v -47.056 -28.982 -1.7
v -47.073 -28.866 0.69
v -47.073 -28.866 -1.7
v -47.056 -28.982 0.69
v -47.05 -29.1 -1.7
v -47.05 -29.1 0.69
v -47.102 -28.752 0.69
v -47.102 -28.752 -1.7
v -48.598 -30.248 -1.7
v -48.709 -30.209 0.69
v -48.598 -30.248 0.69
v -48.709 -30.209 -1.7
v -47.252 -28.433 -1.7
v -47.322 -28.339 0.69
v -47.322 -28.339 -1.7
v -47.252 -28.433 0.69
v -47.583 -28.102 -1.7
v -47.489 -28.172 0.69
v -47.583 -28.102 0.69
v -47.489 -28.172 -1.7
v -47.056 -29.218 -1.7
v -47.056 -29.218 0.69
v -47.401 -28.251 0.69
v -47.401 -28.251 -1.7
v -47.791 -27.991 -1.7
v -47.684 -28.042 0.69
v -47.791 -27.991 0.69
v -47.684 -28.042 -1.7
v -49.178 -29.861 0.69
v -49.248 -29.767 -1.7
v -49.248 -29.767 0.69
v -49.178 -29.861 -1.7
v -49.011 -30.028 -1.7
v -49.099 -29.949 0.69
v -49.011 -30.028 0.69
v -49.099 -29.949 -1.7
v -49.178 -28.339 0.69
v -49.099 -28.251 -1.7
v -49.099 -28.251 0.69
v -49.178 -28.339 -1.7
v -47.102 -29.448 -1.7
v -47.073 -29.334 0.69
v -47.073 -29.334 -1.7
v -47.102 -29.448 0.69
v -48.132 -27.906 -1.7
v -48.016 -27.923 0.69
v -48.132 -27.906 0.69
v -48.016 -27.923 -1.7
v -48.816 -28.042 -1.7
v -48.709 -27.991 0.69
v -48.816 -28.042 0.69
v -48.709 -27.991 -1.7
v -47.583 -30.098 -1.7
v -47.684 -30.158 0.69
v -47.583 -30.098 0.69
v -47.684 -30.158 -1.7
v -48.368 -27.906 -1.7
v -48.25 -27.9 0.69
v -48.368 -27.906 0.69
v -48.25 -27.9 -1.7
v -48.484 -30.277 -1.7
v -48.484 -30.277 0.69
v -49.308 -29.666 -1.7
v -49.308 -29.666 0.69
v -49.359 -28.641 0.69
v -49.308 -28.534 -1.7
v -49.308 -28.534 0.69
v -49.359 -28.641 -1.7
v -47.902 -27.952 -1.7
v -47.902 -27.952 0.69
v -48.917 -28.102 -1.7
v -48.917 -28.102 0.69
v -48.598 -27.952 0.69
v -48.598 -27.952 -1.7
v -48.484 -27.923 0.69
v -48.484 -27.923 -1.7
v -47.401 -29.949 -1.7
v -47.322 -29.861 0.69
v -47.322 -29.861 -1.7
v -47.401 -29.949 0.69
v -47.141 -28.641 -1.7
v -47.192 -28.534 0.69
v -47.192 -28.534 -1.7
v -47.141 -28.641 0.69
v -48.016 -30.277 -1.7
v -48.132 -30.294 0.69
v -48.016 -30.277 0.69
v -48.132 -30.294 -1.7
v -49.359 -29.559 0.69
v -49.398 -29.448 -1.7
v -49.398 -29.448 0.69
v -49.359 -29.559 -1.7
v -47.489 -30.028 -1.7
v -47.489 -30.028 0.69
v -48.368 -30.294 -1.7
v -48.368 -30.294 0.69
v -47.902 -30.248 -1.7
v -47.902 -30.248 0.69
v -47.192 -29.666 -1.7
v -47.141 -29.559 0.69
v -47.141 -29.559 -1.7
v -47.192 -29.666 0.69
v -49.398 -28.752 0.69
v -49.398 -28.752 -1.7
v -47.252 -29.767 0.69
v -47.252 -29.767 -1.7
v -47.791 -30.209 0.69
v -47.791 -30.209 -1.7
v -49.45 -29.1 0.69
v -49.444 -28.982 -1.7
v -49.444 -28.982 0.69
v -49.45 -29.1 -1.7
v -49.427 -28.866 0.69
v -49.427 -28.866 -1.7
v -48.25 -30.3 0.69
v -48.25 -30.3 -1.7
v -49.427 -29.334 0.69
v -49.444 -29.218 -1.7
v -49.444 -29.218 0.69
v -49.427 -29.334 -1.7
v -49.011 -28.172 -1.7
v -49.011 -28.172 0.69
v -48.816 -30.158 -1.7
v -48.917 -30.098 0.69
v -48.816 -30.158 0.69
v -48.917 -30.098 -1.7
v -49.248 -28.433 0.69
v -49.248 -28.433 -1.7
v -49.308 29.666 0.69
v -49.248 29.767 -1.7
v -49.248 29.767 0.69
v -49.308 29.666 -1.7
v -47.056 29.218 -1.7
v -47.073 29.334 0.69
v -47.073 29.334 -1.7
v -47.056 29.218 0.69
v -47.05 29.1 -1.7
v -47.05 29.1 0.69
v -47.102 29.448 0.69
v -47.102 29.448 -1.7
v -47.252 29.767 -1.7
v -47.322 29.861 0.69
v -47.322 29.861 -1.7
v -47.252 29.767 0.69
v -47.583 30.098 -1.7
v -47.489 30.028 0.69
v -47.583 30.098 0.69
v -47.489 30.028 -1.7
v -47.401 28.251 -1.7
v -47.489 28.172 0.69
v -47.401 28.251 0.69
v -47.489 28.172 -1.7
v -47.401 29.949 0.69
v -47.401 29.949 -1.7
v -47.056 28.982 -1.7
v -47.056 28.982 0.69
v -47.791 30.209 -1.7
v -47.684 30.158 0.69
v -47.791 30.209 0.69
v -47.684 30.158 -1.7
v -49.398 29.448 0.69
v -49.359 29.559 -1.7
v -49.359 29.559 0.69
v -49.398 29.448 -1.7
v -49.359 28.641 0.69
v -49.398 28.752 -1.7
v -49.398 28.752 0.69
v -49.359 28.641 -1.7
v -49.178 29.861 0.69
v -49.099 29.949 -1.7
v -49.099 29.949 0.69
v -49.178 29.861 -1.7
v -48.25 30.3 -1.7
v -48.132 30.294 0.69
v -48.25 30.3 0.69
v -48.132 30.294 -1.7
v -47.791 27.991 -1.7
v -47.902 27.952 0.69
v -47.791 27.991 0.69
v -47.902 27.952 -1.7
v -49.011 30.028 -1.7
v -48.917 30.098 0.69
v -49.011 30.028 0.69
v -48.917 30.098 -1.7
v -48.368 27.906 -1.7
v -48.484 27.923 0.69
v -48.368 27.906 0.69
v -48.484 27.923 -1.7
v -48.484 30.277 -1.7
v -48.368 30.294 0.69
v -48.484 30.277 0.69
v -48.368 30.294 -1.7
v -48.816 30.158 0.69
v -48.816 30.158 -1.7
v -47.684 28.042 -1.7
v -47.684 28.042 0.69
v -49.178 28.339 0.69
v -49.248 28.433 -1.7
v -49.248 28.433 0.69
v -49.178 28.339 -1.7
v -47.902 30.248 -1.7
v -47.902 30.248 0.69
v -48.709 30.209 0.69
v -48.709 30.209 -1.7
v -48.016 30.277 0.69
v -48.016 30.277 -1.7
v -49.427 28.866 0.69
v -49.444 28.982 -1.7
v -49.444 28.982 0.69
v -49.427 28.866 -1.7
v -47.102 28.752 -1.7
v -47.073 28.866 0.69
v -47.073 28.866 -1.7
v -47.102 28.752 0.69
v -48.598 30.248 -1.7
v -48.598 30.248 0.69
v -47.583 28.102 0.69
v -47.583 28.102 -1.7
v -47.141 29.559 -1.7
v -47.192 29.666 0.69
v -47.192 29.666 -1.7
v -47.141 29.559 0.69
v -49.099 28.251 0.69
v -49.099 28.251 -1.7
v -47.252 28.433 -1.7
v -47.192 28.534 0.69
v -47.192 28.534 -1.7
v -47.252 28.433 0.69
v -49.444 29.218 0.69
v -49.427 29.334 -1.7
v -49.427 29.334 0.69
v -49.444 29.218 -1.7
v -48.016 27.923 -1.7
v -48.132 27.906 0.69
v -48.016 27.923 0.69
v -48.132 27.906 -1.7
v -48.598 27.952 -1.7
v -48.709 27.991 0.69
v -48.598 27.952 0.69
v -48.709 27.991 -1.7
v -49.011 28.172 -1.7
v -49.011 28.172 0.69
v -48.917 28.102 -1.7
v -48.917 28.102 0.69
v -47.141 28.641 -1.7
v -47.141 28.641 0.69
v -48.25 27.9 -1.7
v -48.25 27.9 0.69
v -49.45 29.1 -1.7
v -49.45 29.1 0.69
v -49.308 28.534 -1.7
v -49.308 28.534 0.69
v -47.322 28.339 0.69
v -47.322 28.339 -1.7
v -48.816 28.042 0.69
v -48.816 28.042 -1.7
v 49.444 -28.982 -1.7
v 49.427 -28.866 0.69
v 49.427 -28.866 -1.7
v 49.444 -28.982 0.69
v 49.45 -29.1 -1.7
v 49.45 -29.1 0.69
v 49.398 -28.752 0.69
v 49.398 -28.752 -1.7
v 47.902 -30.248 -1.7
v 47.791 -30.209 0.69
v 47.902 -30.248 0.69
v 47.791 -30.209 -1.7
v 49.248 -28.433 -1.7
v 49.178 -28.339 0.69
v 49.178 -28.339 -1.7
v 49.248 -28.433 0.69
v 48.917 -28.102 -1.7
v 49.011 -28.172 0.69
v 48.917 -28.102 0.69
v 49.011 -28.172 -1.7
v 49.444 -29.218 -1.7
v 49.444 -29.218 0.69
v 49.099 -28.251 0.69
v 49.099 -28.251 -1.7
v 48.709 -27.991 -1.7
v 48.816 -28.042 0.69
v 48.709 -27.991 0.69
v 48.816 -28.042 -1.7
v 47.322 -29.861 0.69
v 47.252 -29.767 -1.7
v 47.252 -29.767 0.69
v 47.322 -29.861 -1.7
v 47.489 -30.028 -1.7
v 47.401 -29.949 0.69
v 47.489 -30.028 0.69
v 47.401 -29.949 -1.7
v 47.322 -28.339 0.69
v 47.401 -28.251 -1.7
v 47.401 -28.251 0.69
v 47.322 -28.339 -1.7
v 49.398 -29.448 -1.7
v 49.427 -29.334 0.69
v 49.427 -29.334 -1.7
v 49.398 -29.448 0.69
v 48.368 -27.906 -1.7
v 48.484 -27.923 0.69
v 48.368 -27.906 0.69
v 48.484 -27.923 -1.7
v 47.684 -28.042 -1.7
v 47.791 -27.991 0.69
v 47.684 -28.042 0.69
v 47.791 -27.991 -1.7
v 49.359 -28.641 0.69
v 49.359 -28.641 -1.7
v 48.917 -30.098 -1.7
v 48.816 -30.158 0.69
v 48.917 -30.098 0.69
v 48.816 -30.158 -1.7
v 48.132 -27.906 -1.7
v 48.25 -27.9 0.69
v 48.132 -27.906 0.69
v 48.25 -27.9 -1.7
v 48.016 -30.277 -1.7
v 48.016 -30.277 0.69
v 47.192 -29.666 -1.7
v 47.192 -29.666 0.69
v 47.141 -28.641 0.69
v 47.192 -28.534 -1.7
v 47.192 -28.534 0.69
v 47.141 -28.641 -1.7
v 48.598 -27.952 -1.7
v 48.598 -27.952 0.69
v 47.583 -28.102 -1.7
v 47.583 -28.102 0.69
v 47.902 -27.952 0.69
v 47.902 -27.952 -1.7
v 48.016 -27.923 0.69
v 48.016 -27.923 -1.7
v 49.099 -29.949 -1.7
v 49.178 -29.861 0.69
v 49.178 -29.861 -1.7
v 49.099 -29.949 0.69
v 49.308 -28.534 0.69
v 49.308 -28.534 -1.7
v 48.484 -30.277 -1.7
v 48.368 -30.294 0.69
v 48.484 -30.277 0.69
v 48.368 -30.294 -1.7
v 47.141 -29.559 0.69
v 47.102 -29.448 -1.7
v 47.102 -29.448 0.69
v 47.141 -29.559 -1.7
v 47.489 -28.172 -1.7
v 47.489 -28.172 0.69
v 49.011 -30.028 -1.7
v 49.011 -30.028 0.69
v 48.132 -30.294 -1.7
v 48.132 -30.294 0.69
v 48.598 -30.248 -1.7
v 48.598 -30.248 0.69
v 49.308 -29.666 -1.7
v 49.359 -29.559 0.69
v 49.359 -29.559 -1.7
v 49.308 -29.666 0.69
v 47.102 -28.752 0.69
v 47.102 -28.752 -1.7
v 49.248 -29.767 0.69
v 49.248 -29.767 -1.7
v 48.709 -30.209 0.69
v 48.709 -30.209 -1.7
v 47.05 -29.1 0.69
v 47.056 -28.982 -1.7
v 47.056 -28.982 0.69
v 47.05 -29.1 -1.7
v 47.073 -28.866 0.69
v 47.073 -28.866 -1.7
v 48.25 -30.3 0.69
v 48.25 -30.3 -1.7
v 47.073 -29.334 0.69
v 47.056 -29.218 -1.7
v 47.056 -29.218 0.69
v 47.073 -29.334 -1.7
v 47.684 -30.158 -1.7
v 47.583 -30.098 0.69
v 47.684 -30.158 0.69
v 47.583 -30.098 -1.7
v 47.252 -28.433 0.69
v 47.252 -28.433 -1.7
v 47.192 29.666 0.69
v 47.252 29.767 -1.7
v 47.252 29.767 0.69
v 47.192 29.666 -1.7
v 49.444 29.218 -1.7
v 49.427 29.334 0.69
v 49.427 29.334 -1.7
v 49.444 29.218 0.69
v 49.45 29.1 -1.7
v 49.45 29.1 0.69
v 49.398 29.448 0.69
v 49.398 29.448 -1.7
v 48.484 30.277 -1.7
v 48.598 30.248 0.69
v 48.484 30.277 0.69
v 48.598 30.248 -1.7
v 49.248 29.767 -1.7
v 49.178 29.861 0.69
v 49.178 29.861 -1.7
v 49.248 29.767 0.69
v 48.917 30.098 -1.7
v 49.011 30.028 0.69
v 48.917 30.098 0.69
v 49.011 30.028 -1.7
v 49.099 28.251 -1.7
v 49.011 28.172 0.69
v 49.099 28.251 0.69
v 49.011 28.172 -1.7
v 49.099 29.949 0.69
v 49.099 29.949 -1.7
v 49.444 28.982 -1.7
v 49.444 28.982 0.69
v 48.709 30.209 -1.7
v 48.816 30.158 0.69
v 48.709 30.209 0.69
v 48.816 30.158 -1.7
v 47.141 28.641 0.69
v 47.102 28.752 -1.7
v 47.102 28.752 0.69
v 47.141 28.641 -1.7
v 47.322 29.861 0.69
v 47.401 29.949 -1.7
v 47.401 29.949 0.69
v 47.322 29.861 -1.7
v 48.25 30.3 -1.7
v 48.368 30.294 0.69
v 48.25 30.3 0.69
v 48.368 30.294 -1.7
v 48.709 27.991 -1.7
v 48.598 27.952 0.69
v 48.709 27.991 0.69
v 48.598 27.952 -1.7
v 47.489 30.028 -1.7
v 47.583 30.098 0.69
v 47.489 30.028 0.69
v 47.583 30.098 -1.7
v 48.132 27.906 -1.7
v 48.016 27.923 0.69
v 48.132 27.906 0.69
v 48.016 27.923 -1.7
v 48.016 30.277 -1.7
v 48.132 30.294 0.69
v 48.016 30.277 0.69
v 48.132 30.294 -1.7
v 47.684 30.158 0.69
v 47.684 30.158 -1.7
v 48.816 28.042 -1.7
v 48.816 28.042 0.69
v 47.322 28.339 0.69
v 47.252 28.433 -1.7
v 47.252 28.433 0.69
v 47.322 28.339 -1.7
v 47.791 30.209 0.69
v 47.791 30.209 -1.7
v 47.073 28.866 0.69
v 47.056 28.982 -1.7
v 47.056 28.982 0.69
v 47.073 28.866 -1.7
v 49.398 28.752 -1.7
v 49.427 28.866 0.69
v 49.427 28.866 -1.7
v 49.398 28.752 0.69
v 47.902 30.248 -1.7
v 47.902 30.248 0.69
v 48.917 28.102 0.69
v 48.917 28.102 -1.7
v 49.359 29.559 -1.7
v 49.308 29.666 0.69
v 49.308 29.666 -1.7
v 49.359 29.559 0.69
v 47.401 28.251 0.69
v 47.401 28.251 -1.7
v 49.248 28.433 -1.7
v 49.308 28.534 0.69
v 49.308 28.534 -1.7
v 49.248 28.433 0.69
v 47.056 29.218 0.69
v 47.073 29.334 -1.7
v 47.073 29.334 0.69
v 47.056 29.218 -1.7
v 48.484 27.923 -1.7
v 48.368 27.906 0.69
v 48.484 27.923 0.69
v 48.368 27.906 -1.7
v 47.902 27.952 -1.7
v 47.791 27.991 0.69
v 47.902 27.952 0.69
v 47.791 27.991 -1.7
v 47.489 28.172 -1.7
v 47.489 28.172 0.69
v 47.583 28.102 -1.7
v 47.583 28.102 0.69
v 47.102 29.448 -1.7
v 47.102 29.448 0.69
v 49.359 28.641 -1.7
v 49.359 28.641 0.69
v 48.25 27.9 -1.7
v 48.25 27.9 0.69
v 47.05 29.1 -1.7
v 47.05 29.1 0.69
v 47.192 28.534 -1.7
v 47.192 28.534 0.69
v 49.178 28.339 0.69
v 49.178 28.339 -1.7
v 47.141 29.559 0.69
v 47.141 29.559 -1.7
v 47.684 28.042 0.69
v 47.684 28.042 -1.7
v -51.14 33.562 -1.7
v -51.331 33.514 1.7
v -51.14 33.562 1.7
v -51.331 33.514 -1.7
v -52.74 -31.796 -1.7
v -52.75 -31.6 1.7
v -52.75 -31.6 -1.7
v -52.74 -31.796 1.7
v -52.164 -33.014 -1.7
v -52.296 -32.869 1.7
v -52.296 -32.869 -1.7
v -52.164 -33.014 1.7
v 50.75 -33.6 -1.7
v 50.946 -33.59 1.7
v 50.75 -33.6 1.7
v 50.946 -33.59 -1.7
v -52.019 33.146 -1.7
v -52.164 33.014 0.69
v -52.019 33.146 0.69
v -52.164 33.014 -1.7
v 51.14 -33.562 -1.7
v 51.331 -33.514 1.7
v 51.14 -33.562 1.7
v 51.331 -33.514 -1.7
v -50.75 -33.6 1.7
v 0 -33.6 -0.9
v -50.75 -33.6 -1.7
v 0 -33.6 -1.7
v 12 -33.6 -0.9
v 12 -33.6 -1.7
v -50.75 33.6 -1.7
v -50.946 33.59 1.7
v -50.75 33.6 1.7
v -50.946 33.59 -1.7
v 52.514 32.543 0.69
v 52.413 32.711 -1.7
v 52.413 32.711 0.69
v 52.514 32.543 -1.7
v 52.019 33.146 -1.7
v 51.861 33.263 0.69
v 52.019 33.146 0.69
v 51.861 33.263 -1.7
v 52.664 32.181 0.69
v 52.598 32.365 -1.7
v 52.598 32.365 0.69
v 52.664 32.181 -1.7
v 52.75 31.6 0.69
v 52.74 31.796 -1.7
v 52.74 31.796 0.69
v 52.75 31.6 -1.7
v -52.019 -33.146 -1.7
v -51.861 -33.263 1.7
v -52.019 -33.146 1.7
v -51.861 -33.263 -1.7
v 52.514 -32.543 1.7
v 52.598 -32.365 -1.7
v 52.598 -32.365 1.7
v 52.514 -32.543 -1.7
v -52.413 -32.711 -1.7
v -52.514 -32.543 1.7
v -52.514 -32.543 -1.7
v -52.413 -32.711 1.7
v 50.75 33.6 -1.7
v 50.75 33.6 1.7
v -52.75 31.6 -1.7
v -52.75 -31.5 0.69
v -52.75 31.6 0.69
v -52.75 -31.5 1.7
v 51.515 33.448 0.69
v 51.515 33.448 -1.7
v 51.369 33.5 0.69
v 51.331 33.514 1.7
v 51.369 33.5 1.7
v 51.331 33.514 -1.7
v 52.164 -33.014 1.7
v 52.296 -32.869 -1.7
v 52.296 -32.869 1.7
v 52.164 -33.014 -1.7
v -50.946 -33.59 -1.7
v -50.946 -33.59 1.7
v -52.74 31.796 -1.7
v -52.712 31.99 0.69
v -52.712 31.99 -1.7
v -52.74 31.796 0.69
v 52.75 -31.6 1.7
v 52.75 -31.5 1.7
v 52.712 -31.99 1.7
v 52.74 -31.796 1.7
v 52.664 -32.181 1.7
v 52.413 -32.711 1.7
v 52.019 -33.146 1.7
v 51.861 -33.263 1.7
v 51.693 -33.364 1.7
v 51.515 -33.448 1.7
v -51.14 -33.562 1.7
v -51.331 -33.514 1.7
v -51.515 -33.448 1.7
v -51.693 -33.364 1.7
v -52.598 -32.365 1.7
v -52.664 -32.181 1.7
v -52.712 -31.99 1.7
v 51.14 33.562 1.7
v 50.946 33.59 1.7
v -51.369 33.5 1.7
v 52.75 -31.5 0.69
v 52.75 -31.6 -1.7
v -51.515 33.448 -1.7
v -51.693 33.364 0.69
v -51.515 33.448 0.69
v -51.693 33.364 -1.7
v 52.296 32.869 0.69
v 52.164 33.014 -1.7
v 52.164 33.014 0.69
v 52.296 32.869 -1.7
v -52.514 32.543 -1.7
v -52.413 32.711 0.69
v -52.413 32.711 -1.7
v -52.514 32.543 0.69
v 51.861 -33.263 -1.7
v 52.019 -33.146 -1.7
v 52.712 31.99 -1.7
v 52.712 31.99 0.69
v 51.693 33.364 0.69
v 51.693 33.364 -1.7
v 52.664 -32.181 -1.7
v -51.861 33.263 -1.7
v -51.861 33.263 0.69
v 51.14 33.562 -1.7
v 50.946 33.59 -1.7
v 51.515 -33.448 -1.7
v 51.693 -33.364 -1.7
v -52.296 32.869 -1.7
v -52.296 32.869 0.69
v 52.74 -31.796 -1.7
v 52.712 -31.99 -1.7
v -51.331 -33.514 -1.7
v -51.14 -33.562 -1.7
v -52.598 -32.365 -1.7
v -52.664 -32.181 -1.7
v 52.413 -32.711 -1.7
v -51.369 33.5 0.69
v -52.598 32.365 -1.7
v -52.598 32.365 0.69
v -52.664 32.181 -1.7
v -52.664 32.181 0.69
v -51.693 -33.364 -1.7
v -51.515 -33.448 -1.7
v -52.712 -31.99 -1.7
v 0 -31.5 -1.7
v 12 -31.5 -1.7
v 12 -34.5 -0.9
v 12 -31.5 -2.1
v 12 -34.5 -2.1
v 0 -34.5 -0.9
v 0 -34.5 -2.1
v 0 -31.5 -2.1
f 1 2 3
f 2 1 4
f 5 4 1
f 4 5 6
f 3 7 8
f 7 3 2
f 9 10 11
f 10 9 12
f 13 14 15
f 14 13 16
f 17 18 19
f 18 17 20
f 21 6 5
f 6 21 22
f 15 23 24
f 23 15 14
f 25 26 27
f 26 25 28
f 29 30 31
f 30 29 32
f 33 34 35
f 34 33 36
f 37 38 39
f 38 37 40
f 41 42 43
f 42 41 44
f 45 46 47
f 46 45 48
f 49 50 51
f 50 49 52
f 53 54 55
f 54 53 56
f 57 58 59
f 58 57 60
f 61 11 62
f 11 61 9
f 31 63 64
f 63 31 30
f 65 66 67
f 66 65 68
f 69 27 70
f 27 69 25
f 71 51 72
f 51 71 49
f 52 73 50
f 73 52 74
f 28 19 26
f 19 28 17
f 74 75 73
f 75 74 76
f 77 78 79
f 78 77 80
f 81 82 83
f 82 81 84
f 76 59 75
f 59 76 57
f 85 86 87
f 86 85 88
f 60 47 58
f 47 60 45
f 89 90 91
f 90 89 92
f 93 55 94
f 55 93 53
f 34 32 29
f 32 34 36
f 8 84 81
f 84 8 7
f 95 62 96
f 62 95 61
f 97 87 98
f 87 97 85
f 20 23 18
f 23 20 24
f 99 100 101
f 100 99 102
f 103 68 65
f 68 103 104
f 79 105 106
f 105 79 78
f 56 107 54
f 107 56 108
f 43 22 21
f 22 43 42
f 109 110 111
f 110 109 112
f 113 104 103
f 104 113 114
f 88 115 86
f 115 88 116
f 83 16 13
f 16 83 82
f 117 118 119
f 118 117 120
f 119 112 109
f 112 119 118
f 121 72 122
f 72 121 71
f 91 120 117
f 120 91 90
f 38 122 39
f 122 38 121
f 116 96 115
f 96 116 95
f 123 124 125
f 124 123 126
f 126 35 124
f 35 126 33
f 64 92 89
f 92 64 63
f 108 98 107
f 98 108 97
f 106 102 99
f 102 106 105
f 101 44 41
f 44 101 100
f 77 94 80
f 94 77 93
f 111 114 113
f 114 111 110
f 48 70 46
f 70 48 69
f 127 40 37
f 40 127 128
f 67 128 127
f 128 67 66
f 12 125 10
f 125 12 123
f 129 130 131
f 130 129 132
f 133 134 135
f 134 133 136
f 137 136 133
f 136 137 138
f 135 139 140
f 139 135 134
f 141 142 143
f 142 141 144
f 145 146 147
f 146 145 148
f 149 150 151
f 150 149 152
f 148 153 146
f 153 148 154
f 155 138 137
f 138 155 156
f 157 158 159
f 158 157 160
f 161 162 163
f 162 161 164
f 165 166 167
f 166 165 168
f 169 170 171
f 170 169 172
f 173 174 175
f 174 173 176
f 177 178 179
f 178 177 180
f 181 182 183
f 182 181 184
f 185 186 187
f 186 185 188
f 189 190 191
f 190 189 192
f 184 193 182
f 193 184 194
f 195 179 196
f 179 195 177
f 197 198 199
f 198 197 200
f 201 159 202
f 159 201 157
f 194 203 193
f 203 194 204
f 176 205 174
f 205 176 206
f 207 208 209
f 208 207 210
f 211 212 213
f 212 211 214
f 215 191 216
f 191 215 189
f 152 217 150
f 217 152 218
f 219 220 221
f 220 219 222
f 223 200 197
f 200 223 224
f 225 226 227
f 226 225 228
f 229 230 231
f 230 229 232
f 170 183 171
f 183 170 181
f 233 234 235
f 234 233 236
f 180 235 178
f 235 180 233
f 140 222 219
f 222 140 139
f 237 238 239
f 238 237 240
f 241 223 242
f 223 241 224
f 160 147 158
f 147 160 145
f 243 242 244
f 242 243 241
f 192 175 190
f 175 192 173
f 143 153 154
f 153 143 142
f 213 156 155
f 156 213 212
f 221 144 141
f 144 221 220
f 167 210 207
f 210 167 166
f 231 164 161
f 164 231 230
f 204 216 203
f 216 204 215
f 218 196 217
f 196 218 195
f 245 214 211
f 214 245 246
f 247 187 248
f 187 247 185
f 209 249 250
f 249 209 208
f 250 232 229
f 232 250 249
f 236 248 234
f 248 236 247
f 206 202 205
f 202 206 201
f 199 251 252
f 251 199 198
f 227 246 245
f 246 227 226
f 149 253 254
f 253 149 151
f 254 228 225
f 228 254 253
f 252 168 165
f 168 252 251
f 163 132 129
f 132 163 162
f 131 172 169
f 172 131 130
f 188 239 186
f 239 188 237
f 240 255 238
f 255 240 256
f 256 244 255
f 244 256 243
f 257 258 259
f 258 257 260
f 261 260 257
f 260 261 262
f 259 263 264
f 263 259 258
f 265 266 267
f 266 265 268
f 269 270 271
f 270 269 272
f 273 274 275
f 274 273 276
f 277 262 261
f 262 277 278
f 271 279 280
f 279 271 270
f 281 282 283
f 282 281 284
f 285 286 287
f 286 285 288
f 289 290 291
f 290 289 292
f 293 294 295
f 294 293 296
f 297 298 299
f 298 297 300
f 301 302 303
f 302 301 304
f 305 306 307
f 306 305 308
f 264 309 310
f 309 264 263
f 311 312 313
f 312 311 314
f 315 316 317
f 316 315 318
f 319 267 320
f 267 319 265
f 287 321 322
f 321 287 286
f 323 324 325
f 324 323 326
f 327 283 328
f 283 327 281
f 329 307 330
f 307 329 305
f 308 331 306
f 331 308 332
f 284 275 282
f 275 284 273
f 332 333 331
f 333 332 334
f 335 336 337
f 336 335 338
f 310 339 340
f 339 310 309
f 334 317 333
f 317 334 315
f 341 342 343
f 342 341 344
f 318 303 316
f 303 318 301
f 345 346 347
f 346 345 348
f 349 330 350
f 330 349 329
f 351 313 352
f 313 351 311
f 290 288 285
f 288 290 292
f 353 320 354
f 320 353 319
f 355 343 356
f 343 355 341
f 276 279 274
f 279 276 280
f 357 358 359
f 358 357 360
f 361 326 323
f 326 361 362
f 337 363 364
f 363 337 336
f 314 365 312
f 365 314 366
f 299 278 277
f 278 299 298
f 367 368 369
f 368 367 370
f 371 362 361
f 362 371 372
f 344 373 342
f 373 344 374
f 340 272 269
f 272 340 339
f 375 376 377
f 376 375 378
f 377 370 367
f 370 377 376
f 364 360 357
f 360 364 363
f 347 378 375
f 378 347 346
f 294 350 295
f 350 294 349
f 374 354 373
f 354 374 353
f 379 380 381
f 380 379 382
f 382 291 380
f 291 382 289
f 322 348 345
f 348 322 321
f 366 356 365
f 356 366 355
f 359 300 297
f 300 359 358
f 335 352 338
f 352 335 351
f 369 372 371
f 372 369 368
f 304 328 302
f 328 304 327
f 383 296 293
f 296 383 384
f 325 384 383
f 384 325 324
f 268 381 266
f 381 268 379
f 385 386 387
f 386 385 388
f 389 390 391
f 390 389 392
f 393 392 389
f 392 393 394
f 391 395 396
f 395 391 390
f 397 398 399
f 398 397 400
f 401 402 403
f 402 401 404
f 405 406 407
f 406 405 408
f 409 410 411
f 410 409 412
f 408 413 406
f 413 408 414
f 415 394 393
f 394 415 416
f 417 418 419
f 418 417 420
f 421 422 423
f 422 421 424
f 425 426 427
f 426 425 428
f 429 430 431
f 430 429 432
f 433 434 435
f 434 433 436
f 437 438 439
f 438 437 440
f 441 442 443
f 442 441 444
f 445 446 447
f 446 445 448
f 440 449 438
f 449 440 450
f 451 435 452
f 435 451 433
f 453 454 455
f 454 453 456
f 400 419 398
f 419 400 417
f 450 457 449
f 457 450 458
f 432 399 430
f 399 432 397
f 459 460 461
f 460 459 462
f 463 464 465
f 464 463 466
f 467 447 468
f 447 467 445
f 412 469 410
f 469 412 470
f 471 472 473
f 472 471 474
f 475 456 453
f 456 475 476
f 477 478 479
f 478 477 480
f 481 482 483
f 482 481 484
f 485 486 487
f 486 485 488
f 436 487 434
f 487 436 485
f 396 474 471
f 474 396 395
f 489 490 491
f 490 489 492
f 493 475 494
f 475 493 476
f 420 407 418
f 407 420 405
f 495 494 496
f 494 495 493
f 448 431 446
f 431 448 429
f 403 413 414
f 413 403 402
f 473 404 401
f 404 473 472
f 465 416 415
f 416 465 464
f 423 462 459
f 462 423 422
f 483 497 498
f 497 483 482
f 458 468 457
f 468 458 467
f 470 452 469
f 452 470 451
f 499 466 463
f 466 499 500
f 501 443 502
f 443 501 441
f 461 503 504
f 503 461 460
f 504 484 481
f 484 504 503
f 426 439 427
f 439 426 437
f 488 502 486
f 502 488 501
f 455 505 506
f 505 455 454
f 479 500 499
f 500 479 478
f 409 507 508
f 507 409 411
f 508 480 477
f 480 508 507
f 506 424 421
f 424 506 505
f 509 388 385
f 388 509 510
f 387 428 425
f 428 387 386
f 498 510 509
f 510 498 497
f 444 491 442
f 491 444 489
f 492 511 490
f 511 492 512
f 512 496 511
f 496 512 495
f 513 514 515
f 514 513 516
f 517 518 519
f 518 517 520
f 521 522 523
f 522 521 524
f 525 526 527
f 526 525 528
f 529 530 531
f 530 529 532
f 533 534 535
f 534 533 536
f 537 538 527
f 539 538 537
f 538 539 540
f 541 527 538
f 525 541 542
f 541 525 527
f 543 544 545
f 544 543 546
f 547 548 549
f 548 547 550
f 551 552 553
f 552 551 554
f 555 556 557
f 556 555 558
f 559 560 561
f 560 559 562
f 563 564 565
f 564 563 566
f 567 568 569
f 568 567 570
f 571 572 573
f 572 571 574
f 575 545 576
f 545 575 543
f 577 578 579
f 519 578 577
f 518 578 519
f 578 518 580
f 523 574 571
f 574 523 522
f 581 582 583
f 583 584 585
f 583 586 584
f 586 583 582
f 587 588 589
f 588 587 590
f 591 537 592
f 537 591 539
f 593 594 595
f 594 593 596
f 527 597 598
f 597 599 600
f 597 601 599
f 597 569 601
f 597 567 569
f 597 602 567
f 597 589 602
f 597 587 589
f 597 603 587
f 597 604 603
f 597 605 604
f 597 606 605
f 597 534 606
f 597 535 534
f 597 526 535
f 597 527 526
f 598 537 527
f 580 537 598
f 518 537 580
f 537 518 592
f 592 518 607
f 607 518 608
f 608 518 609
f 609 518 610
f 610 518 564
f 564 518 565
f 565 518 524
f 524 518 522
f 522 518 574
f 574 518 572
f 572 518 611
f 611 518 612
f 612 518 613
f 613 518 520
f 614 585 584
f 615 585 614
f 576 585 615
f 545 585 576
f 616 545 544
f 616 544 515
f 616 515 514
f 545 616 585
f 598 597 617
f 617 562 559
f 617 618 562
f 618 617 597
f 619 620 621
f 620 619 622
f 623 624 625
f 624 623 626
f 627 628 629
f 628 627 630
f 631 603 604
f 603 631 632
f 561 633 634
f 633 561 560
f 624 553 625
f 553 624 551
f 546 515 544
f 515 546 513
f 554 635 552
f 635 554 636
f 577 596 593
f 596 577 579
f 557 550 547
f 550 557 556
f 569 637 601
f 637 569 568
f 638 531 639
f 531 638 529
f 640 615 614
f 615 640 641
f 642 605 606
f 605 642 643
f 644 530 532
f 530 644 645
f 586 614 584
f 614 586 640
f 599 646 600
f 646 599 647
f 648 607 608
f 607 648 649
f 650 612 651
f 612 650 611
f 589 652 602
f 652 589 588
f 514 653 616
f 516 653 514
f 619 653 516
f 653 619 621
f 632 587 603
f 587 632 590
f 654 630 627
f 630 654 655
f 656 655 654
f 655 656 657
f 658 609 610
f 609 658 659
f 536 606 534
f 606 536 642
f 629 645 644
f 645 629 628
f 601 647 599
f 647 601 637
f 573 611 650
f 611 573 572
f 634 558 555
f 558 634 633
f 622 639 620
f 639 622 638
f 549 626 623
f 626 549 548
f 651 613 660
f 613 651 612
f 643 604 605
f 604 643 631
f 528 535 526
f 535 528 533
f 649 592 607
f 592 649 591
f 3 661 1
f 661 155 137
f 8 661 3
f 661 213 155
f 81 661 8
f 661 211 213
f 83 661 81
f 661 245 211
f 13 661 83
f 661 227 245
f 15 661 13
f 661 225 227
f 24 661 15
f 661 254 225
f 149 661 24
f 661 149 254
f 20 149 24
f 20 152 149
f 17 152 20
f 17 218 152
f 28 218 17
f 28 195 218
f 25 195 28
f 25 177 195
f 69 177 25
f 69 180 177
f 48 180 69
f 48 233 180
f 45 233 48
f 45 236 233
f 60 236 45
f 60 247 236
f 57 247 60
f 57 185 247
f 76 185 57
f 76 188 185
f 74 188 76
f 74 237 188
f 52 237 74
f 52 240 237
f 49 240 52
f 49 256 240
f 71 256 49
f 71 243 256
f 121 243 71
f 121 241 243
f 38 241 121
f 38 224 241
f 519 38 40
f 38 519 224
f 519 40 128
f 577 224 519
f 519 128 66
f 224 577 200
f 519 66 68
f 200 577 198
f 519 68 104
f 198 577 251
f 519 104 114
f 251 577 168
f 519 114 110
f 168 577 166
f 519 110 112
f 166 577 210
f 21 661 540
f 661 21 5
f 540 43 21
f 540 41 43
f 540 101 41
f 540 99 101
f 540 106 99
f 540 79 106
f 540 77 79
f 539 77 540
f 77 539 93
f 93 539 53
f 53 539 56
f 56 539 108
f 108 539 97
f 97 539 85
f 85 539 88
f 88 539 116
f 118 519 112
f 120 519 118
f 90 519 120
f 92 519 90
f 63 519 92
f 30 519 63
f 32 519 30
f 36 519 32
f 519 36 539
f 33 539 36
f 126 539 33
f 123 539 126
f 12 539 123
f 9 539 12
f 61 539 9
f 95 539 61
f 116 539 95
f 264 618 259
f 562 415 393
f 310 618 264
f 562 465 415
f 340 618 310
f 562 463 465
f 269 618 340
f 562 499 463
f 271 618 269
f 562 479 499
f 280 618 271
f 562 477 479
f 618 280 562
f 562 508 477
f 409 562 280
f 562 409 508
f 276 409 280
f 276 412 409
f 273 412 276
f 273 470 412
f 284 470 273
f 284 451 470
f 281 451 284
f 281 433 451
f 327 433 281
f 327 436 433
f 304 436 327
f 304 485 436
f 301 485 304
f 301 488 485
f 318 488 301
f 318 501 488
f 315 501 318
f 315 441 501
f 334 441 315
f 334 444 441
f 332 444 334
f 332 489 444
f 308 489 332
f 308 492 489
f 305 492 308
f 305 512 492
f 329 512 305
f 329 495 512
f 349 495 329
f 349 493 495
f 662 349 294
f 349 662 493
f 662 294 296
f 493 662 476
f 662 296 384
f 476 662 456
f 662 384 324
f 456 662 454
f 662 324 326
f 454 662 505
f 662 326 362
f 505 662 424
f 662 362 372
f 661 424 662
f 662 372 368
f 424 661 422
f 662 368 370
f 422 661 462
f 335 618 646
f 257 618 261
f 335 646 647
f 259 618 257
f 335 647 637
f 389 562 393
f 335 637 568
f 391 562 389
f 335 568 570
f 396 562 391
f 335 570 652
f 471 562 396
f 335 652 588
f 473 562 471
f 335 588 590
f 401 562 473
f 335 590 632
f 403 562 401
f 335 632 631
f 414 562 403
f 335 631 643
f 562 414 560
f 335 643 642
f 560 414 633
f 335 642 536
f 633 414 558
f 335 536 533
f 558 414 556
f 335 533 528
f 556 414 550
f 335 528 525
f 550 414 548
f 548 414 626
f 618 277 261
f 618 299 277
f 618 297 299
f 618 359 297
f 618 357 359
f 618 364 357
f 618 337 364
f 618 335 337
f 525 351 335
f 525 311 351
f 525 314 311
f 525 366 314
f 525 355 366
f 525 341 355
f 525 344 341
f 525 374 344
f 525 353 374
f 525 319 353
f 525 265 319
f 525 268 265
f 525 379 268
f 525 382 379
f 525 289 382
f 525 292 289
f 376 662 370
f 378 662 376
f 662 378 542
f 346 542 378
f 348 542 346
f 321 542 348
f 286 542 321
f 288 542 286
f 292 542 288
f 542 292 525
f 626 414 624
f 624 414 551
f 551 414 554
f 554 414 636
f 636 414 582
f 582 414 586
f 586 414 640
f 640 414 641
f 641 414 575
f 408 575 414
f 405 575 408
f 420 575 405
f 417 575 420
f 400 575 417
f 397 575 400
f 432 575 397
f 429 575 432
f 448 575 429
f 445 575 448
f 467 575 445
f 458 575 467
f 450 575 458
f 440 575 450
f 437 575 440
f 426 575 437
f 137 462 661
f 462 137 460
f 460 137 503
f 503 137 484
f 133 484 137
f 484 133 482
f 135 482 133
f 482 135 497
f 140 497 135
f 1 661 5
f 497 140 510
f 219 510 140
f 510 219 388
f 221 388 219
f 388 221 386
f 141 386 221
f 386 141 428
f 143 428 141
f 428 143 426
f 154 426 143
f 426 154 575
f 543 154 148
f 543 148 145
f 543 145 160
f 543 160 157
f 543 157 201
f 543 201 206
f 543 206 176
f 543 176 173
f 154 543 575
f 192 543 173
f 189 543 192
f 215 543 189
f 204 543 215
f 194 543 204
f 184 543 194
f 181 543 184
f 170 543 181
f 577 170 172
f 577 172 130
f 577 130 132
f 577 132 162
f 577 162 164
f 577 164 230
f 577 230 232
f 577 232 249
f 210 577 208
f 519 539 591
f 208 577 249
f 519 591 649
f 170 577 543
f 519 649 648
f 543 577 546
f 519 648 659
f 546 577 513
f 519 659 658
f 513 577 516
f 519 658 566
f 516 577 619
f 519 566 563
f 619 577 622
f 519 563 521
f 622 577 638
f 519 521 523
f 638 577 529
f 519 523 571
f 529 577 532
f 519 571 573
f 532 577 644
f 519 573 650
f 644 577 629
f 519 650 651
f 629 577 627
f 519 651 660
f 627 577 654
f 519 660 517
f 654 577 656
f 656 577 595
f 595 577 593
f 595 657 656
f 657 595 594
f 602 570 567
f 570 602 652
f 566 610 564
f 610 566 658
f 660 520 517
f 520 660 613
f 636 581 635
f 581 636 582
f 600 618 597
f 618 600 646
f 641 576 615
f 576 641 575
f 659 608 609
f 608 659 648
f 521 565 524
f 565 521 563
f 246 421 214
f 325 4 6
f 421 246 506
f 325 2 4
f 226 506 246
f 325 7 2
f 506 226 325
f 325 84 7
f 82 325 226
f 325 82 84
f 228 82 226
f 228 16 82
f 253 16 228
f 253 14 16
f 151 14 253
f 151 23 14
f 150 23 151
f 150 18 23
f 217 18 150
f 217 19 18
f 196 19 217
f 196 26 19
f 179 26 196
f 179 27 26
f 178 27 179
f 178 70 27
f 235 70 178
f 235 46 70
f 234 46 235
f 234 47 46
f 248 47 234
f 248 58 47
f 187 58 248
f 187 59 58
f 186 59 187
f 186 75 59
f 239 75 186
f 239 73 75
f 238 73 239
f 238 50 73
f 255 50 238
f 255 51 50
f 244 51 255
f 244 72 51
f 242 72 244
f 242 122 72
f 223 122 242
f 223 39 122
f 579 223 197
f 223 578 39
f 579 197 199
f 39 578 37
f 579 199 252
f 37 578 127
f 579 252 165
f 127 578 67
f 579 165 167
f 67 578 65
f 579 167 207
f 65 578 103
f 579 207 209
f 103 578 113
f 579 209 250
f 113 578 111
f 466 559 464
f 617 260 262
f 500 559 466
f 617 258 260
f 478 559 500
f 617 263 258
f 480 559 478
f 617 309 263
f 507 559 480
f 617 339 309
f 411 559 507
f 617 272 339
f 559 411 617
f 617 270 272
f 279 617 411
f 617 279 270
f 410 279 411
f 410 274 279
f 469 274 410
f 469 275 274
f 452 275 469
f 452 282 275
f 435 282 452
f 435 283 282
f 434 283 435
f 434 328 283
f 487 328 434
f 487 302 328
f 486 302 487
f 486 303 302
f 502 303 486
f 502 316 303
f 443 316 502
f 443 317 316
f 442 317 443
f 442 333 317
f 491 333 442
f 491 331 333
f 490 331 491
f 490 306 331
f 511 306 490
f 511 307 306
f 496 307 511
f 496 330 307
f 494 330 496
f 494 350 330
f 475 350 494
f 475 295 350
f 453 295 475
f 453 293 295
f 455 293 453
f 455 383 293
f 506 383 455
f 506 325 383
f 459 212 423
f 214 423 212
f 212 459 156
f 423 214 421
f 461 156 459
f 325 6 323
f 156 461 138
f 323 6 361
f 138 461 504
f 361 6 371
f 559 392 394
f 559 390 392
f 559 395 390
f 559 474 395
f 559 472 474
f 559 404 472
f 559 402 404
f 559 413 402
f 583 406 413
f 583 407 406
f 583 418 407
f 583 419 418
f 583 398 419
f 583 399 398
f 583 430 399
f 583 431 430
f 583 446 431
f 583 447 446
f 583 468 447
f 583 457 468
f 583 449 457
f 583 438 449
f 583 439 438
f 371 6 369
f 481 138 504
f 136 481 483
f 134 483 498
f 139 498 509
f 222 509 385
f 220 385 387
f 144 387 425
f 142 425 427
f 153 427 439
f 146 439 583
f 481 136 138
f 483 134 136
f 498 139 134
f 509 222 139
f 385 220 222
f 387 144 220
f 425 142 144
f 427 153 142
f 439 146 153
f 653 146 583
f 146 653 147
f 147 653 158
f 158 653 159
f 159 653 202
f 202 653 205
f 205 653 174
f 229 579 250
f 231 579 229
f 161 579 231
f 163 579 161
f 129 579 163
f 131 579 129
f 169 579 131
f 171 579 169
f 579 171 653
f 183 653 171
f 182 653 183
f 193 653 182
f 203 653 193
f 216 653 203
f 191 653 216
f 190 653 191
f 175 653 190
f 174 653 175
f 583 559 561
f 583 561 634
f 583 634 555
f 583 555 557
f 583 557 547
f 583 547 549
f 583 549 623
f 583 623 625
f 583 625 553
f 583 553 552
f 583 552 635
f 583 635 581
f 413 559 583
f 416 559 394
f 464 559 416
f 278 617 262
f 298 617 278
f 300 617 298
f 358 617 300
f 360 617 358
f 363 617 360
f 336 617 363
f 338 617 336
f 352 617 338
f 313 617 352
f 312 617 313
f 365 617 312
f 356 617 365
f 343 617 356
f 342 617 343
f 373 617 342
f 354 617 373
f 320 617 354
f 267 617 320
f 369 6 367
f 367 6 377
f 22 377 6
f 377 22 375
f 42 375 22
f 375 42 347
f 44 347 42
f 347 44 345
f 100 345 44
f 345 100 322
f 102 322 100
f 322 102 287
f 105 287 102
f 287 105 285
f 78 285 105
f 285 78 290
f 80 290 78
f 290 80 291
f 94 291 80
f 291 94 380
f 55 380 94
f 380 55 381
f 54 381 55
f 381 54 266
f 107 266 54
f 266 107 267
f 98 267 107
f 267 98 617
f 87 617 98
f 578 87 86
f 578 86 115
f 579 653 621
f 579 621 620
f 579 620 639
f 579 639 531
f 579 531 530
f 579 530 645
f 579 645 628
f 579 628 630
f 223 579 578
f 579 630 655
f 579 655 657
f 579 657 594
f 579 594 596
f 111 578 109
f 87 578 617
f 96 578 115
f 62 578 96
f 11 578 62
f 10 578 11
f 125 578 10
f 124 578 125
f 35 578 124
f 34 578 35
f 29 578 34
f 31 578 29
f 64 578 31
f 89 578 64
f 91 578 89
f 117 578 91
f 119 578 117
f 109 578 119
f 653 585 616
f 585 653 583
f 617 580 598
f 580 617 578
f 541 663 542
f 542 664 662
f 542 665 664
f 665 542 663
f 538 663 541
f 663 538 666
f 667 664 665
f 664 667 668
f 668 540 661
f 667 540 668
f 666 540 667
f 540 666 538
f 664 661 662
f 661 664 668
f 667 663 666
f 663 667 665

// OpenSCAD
// LCD display 4.3" — 105.5 x 67.2 x 3.4
// Features per spec:
// - Display window: [[-50, -26.5], [50, 31.5, 0.5]]
// - Bezel relief:  [[-105.5/2, -65/2 + 1], [105.5/2, 65/2 + 1, 1]]
// - Bottom connector: [[0, -34.5], [12, -31.5]]
// Model is ONE connected solid.

$fn = 64;

// Parameters
body_L = 105.5;
body_W = 67.2;
body_H = 3.4;

origin = [0, 0, 0];

// Display window (cut)
display_win_p1 = [-50, -26.5];
display_win_p2 = [ 50,  31.5];
display_win_depth = 0.5;

// Bezel relief (cut)
bezel_relief_p1 = [-body_L/2, -65/2 + 1];   // [-52.75, -31.5]
bezel_relief_p2 = [ body_L/2,  65/2 + 1];   // [ 52.75,  33.5]
bezel_relief_depth = 1.0;

// Bottom connector (solid)
connector_p1 = [0,  -34.5];
connector_p2 = [12, -31.5];
connector_H = 1.2;
connector_overlap = 0.8; // overlap into body to guarantee connectivity

// Mounting holes (cut)
mount_hole_d = 2.4;
mount_edge_margin_x = 4.5;
mount_edge_margin_y = 4.5;

// Corner rounding
corner_round_r = 2.0;

// Helpers
function rect_size(p1, p2) = [abs(p2[0]-p1[0]), abs(p2[1]-p1[1])];
function rect_center(p1, p2) = [(p1[0]+p2[0])/2, (p1[1]+p2[1])/2];

module rounded_box(size=[10,10,2], r=1) {
  // Robust rounded rectangle prism using hull of corner cylinders
  L = size[0]; W = size[1]; H = size[2];
  rr = min(r, min(L, W)/2 - 0.001);
  hull() {
    for (sx = [-1, 1], sy = [-1, 1])
      translate([sx*(L/2-rr), sy*(W/2-rr), 0])
        cylinder(r=rr, h=H, center=true);
  }
}

module lcd_main_body() {
  difference() {
    // Main body (centered at origin)
    translate(origin)
      rounded_box([body_L, body_W, body_H], r=corner_round_r);

    // Front bezel relief cut (from front face)
    bezel_sz = rect_size(bezel_relief_p1, bezel_relief_p2);
    bezel_ct = rect_center(bezel_relief_p1, bezel_relief_p2);
    translate([origin[0] + bezel_ct[0],
               origin[1] + bezel_ct[1],
               origin[2] + body_H/2 - bezel_relief_depth/2])
      cube([bezel_sz[0], bezel_sz[1], bezel_relief_depth + 0.02], center=true);

    // Front display window cut (from front face)
    win_sz = rect_size(display_win_p1, display_win_p2);
    win_ct = rect_center(display_win_p1, display_win_p2);
    translate([origin[0] + win_ct[0],
               origin[1] + win_ct[1],
               origin[2] + body_H/2 - display_win_depth/2])
      cube([win_sz[0], win_sz[1], display_win_depth + 0.02], center=true);

    // Mounting holes (through)
    for (xsgn = [-1, 1], ysgn = [-1, 1]) {
      translate([origin[0] + xsgn*(body_L/2 - mount_edge_margin_x),
                 origin[1] + ysgn*(body_W/2 - mount_edge_margin_y),
                 origin[2]])
        cylinder(d=mount_hole_d, h=body_H + 0.5, center=true);
    }
  }
}

module bottom_connector() {
  // Ensure non-zero dimensions
  conn_sz_xy = rect_size(connector_p1, connector_p2);
  conn_L = max(conn_sz_xy[0], 0.2);
  conn_W = max(conn_sz_xy[1], 0.2);
  conn_ct = rect_center(connector_p1, connector_p2);

  // Place so its top overlaps into the body by connector_overlap
  // Body bottom is at z = -body_H/2
  // Connector top should be at z = -body_H/2 + connector_overlap
  // => center z = top - connector_H/2
  conn_center_z = origin[2] + (-body_H/2 + connector_overlap) - connector_H/2;

  translate([origin[0] + conn_ct[0],
             origin[1] + conn_ct[1],
             conn_center_z])
    cube([conn_L, conn_W, connector_H], center=true);
}

module lcd_module() {
  union() {
    lcd_main_body();
    bottom_connector();
  }
}

color([0.85, 0.85, 0.8])
lcd_module();
